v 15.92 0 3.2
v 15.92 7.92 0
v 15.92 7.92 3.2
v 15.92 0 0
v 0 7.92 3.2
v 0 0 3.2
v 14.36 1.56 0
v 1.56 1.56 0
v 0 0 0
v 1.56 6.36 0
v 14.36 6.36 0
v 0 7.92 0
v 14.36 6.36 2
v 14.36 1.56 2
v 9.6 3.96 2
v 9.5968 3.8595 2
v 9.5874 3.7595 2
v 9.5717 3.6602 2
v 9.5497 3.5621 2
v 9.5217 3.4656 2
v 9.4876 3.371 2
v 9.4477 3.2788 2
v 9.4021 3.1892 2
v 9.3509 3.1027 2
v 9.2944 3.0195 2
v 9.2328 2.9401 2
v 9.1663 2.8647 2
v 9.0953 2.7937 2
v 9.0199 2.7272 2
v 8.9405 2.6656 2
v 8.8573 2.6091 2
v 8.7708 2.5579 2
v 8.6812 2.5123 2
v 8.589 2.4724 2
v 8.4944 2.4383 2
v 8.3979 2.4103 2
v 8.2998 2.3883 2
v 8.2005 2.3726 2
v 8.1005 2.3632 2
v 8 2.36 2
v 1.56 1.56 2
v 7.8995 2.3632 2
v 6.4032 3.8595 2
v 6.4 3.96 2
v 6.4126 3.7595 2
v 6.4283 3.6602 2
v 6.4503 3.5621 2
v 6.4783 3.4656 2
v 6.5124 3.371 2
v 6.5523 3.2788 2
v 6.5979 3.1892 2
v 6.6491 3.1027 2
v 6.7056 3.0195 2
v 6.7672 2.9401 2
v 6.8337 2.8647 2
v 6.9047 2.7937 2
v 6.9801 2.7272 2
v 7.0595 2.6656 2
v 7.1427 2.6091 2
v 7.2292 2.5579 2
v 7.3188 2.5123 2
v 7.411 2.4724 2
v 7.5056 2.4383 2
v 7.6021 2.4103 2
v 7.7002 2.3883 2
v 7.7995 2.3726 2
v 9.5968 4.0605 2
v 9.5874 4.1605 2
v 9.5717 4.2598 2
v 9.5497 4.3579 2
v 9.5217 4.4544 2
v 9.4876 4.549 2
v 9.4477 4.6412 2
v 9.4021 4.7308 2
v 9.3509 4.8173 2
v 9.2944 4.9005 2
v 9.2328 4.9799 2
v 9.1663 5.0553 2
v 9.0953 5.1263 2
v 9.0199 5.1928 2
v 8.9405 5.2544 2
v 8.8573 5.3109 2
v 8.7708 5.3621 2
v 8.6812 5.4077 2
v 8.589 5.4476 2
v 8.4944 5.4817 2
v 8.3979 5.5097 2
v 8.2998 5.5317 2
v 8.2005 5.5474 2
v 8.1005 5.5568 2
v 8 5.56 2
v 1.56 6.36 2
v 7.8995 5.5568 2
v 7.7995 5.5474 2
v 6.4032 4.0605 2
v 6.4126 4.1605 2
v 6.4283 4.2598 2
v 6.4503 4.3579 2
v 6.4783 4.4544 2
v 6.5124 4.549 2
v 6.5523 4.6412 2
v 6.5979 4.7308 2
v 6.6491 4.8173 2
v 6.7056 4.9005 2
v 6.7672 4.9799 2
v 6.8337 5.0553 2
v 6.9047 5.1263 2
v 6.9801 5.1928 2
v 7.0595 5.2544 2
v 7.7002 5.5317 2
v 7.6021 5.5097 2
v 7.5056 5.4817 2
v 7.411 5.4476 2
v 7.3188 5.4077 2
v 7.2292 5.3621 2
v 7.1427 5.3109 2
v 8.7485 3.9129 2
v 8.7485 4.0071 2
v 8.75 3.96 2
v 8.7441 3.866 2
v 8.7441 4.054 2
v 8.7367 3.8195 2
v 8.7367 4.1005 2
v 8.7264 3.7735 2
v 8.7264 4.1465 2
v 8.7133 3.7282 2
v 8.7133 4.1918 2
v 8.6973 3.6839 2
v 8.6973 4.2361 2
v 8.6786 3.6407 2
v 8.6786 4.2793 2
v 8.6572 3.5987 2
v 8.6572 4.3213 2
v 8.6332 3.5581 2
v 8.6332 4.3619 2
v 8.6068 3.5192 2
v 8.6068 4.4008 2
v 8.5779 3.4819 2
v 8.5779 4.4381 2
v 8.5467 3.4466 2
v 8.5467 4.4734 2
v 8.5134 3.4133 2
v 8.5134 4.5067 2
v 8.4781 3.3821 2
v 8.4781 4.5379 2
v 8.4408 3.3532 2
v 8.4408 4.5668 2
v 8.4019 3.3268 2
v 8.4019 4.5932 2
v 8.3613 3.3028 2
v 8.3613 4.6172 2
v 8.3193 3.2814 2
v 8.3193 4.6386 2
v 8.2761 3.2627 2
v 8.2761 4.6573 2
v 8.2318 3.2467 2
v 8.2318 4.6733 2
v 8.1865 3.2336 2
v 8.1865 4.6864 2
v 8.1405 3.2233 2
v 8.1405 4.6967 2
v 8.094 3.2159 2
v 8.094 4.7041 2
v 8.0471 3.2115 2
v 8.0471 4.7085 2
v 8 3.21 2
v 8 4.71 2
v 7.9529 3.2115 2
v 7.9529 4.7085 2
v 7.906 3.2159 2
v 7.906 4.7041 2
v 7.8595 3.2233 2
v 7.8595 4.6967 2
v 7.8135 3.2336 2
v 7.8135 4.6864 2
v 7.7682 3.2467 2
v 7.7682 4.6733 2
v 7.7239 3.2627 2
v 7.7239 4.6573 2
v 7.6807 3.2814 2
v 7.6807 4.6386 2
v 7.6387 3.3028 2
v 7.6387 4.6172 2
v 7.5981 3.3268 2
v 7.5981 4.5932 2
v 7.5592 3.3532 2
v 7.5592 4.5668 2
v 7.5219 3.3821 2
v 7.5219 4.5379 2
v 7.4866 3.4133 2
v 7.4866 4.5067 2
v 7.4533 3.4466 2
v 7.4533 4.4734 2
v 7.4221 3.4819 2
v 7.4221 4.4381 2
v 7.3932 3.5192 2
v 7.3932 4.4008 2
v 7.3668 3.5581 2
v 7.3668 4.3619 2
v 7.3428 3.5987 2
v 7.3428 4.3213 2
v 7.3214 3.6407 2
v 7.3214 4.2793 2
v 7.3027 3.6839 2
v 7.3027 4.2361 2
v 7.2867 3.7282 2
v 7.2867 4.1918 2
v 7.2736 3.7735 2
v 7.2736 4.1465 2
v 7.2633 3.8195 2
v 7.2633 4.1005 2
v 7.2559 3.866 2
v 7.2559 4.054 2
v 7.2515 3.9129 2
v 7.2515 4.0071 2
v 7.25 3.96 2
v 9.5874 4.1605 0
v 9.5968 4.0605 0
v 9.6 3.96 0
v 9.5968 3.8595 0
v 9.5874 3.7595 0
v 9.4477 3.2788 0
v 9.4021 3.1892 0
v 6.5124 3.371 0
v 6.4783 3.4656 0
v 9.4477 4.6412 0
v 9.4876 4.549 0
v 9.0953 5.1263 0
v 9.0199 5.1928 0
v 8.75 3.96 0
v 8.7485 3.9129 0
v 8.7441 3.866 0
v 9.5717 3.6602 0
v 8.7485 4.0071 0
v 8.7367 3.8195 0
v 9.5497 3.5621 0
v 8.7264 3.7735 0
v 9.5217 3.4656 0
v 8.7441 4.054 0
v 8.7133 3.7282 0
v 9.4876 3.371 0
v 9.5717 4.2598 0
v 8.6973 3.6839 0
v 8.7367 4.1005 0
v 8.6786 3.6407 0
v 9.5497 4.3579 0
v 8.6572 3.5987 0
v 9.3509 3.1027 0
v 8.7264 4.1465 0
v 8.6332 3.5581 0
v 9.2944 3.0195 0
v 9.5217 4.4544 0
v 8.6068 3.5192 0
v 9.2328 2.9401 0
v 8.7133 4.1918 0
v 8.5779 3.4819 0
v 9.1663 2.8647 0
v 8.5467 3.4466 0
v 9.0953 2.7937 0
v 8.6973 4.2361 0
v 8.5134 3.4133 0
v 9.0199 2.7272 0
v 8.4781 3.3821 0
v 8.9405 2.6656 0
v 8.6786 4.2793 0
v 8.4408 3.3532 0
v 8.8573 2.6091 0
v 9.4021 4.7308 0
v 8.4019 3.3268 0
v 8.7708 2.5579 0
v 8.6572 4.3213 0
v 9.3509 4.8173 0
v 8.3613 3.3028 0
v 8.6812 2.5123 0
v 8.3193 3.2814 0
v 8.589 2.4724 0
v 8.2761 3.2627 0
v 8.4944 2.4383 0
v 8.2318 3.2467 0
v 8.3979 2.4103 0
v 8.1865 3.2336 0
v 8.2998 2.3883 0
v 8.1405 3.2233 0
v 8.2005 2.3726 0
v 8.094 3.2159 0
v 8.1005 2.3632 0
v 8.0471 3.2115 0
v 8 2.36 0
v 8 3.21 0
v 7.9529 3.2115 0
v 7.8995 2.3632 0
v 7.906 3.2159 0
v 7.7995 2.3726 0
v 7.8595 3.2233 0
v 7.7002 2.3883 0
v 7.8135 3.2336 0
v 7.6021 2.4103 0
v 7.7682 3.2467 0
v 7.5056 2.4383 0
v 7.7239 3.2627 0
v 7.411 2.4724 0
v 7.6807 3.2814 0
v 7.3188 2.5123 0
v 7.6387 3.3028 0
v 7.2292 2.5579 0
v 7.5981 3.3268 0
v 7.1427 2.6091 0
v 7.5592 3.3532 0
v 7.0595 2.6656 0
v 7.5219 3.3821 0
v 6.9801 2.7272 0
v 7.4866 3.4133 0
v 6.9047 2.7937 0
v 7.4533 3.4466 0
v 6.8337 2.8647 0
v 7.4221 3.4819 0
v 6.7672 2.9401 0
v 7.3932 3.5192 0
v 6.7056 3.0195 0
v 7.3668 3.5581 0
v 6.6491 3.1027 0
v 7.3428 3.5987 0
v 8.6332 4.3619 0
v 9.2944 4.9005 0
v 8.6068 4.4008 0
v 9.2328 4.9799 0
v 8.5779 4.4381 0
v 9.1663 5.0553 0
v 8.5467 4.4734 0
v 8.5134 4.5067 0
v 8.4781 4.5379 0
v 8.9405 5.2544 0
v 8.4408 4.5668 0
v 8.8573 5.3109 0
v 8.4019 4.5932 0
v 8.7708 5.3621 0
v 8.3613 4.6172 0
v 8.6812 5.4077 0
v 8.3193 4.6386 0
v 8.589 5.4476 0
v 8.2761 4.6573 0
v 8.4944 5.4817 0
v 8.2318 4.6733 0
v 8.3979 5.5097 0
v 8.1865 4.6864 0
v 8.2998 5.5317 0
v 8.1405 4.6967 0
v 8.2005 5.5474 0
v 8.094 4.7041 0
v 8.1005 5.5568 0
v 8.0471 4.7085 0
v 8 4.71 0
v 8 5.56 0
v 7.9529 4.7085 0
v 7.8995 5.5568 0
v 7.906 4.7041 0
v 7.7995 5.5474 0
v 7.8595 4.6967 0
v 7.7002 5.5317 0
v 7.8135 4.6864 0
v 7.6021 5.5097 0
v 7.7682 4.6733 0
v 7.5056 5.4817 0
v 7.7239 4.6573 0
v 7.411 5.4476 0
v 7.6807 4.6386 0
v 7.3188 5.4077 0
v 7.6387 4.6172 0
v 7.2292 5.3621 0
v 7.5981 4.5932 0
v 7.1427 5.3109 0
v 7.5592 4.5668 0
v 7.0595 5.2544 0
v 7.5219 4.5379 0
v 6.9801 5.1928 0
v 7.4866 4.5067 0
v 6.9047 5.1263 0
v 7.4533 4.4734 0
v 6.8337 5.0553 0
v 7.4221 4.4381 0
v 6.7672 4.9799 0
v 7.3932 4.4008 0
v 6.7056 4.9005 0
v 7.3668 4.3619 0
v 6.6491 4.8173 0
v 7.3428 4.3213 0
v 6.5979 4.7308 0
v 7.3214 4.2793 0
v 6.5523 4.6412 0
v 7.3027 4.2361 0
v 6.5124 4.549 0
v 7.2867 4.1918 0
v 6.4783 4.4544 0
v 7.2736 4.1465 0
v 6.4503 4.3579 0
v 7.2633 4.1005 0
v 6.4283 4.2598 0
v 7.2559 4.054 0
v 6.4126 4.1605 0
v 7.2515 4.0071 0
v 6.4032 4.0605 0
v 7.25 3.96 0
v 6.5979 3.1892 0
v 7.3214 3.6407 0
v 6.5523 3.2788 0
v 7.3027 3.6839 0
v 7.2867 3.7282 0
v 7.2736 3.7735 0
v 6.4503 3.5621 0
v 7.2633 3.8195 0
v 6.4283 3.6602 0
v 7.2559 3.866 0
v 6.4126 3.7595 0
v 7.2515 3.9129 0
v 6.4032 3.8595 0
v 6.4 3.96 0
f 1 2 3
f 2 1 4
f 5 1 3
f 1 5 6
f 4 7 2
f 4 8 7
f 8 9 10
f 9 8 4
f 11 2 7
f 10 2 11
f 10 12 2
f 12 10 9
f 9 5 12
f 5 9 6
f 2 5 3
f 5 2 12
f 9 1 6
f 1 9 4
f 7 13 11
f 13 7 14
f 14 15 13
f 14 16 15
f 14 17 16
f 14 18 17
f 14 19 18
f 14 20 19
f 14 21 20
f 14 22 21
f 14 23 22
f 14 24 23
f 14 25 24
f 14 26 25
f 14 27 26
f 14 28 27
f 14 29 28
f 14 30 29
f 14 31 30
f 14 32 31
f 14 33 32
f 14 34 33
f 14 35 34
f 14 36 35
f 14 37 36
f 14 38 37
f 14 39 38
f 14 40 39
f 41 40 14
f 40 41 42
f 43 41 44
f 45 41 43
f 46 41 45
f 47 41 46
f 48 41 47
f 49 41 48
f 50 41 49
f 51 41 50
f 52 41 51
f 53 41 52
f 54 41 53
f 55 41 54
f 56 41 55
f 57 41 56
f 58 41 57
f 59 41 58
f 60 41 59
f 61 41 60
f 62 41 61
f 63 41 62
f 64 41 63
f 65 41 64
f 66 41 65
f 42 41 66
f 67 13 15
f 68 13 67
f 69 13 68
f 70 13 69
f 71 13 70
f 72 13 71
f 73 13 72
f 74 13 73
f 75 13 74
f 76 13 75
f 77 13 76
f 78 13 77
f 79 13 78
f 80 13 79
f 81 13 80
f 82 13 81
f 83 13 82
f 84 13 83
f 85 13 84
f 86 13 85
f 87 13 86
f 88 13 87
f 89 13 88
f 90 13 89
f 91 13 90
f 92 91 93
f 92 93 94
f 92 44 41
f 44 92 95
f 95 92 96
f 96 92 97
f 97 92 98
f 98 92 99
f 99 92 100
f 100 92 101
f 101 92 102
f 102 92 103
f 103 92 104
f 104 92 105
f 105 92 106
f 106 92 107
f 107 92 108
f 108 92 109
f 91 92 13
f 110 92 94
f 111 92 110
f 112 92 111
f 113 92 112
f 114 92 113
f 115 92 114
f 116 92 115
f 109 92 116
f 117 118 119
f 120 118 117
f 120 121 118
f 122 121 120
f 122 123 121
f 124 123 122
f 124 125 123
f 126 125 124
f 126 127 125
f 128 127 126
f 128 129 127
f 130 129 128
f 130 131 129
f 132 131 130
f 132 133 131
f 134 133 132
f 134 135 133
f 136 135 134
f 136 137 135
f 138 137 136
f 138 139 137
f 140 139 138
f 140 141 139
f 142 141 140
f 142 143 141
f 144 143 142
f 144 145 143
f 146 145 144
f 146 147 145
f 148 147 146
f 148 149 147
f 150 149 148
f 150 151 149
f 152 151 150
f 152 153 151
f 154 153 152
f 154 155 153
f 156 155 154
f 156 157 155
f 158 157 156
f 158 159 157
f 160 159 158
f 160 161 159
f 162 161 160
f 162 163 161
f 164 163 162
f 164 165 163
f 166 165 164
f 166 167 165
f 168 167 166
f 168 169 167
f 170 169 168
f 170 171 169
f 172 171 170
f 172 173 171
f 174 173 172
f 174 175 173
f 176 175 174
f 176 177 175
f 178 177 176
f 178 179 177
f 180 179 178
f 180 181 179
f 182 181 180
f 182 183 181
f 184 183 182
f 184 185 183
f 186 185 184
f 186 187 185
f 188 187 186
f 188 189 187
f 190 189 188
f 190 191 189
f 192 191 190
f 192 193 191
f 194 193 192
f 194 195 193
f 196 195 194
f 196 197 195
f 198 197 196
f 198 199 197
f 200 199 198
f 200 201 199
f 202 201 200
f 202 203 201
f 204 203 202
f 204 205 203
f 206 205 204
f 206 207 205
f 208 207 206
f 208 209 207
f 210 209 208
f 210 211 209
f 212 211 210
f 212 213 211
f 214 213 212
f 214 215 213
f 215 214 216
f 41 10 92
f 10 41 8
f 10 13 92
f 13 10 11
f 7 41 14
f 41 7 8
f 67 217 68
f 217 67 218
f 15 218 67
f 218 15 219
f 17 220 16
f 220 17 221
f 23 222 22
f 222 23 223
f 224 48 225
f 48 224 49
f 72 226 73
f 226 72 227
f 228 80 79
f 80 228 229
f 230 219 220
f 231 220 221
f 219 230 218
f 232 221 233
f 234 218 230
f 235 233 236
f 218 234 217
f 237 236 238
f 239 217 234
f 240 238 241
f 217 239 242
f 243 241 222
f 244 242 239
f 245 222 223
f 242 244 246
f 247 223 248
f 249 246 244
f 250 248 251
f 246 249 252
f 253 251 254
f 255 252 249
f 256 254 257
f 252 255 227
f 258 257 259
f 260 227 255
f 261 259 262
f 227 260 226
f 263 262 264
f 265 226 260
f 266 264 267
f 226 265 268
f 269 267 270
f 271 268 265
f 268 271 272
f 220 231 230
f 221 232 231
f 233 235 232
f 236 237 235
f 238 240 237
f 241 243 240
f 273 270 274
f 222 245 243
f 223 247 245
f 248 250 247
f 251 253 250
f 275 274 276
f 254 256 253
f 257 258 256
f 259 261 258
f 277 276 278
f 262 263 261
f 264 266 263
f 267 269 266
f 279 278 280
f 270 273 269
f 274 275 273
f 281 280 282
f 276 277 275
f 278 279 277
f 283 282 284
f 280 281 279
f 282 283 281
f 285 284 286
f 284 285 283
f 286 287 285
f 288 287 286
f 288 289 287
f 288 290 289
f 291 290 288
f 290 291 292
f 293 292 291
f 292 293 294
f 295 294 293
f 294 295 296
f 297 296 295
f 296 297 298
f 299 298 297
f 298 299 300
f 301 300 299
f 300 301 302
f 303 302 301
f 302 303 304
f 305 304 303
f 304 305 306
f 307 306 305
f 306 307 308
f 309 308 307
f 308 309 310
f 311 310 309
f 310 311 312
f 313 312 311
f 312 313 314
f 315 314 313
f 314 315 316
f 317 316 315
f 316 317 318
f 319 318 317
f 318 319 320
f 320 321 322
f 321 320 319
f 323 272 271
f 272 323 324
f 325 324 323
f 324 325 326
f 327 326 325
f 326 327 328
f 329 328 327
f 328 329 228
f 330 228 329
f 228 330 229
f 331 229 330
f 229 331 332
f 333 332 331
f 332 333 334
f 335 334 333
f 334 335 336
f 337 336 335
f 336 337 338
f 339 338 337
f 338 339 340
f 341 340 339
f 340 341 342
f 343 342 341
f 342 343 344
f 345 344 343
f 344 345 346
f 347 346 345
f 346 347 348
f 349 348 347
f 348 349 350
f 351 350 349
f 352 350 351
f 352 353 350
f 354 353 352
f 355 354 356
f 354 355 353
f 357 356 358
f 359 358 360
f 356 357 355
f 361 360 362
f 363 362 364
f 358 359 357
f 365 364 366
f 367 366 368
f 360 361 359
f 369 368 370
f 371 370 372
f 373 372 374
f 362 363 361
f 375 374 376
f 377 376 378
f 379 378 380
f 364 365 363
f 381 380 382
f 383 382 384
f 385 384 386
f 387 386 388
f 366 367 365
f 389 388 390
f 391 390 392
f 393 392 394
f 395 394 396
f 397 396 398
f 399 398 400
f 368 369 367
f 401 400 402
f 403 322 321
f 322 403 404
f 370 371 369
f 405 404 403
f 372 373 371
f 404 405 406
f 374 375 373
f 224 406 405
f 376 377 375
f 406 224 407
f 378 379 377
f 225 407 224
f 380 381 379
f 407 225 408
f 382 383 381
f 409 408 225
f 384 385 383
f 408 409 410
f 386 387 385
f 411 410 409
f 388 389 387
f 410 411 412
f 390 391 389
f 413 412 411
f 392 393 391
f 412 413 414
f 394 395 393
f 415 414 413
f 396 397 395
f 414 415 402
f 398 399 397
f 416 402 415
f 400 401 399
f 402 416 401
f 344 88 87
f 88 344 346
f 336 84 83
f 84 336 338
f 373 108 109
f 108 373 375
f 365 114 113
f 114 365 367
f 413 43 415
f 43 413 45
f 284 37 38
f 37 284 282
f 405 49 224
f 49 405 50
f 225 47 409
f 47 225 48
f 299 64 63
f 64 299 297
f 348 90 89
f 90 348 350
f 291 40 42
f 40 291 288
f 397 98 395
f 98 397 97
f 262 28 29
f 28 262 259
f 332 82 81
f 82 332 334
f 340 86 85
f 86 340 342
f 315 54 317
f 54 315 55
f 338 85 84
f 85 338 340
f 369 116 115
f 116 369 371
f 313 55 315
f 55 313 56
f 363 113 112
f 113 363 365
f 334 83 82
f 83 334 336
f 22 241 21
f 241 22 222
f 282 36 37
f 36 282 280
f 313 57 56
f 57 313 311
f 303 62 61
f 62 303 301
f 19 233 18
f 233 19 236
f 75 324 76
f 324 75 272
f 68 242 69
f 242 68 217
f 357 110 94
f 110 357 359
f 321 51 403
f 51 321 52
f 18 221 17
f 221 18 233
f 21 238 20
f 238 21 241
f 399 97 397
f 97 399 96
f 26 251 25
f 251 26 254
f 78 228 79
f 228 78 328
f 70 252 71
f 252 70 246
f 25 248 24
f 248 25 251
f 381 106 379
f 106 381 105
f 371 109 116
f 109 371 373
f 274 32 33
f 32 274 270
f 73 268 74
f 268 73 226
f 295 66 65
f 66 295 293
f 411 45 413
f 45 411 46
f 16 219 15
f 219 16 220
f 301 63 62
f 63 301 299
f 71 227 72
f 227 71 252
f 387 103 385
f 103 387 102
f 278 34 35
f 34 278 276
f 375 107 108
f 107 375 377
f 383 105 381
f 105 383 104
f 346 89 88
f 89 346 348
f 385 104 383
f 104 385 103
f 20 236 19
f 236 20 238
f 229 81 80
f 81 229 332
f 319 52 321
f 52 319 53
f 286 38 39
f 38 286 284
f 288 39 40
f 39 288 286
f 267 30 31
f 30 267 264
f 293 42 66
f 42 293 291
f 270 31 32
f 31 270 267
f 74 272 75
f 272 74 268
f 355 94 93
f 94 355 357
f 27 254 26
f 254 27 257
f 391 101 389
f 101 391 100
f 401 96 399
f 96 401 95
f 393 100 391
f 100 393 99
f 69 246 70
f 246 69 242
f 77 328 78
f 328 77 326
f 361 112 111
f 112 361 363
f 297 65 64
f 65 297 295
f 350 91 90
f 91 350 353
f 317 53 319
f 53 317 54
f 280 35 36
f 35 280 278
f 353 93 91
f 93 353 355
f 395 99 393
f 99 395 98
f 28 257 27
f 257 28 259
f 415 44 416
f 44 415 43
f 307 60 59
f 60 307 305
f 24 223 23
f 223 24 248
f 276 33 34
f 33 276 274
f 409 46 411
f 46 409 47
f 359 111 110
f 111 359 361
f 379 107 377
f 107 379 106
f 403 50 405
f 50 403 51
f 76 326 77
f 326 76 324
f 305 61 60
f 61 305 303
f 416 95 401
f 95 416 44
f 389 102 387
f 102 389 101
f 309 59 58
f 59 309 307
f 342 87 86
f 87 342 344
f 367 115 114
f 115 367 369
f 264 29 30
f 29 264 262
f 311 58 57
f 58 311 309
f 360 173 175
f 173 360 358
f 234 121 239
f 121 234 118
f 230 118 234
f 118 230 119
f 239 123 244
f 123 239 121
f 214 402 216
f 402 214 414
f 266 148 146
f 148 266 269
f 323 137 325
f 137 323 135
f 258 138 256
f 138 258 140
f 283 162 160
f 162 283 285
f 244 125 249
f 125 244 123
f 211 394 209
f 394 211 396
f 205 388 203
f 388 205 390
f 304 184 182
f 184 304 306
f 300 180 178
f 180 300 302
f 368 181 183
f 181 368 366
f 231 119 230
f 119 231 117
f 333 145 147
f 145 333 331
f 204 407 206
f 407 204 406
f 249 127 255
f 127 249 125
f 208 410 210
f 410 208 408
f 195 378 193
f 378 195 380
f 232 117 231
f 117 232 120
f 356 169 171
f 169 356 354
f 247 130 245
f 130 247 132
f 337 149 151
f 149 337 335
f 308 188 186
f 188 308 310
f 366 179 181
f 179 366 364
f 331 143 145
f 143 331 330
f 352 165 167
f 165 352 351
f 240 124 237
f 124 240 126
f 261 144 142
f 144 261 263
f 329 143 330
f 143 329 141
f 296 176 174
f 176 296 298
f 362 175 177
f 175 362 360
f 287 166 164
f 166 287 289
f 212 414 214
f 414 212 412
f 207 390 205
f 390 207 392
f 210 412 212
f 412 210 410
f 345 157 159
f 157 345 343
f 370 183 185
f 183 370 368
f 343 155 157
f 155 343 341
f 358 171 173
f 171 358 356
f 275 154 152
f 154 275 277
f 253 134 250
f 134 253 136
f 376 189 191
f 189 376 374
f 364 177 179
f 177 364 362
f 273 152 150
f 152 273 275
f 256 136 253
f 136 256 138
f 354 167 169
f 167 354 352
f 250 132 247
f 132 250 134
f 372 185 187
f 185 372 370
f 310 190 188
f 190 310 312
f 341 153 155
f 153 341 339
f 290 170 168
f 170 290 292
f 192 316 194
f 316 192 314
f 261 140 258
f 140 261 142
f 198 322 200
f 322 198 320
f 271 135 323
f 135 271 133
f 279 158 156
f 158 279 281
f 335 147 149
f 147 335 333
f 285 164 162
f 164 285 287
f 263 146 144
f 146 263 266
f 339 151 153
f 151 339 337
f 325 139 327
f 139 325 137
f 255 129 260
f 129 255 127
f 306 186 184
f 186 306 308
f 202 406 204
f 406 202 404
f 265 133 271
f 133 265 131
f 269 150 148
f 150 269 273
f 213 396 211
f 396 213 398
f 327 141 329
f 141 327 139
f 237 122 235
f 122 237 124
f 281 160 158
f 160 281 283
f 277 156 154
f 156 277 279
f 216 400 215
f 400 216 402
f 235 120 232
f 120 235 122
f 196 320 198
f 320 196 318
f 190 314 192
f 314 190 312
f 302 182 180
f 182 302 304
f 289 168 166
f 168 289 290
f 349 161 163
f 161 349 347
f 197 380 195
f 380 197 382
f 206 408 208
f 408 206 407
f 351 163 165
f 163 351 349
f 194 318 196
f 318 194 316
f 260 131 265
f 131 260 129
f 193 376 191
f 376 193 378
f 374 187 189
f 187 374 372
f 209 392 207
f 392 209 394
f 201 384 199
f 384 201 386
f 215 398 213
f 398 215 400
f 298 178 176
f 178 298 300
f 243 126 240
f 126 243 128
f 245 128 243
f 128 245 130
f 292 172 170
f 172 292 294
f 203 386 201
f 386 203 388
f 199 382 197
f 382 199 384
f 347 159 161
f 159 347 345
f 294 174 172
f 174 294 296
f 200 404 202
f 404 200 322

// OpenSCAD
$fn=100;

eps = 0.1;

nr_length_units = 2;
nr_width_units = 1;

unit_size = 8.0;

pitch = 8.0;
space = 0.04; // space between bricks

h1 = 3.2; // height
h2 = 2.0; // 1.9 inner height

// pin1
r1 = 6.512/2; // 6.4
r2 = 4.8/2; // inner inside pin hole

// pin2
r3 = 3.2/2; // small inner pin diameter
r4 = 1.5/2;


t1 = (1.6-space); // thickness

length = nr_length_units*unit_size + (nr_length_units - 1) * (pitch - unit_size) - 2 * space;
width = nr_width_units*unit_size + (nr_width_units - 1) * (pitch - unit_size) - 2 * space;


h_pin = 1.6; // 1.9
r_pin = 4.8/2; // top pin
r_fillet = 0.25; // top pin fillet


module drawExternalPin()
{
	translate([0,0,h1-eps]) 
    {
        //cylinder(h_pin+eps, r_pin, r_pin);
        fil_polar_o(r_pin,r_fillet,h_pin+eps-r_fillet,angle=90);
    }
}


module drawInternalPin1()
{
	difference()
	{
		translate([0,0,0]) cylinder(h1, r1, r1);
		translate([0,0,-2*eps]) cylinder(h1+2*eps, r2, r2);
	}
}

// 2d primitive for outside fillets.
module fil_2d_o(r, angle=90) {
  intersection() {
    circle(r=r);
    polygon([
      [0, 0],
      [0, r],
      [r * tan(angle/2), r],
      [r * sin(angle), r * cos(angle)]
    ]);
  }
}

// 3d polar outside fillet.
module fil_polar_o(R, r, h, angle=90) {
  union(){
	  translate([0,0,h]) {
		rotate_extrude(convexity=10) {
		    translate([R-r, 0, 0]) {
		      fil_2d_o(r, angle);
		    }
		  }
	      cylinder(r=R-r+0.1, h=r);
      }
      cylinder(r=R, h=h);
  }
}


module drawInternalPin2()
{
	difference()
	{
		translate([0,0,0]) cylinder(h1, r3, r3);
		translate([0,0,-2*eps]) cylinder(h1+2*eps, r4, r4);
	}
}


module drawPlate() 
{
	difference()
	{
		union()
		{	
			cube([length,width,h1]);
		}
		union()
		{	
			translate([t1,t1,-eps]) cube([length-2*t1,width-2*t1,h2+eps]);
		}
	}
/*
	for (x = [1:nr_length_units])
	{
		for (y = [1:nr_width_units])
		{	
			translate([x*pitch-pitch+unit_size/2,y*pitch-pitch+unit_size/2,0])
                    drawExternalPin();
		}
	}
*/
	if ((nr_length_units > 1) && (nr_width_units > 1)) 
	{
		for (x = [1:nr_length_units-1])
		{
			for (y = [1:nr_width_units-1]) 
			{	
				translate([x*pitch-(pitch-unit_size)/2,y*pitch-(pitch-unit_size)/2,0]) drawInternalPin1();
			}
		}
	}

	if ((nr_width_units == 1) && (nr_length_units > 1))
	{
		for (x = [1:nr_length_units-1])
		{
			translate([x*pitch-(pitch-unit_size)/2,width/2,0]) drawInternalPin2();
		}
	}

	if ((nr_length_units == 1) && (nr_width_units > 1))
	{
		for (y = [1:nr_width_units-1])
		{
			translate([length/2,y*pitch-(pitch-unit_size)/2,0]) drawInternalPin2();
		}
	}
}



drawPlate();
